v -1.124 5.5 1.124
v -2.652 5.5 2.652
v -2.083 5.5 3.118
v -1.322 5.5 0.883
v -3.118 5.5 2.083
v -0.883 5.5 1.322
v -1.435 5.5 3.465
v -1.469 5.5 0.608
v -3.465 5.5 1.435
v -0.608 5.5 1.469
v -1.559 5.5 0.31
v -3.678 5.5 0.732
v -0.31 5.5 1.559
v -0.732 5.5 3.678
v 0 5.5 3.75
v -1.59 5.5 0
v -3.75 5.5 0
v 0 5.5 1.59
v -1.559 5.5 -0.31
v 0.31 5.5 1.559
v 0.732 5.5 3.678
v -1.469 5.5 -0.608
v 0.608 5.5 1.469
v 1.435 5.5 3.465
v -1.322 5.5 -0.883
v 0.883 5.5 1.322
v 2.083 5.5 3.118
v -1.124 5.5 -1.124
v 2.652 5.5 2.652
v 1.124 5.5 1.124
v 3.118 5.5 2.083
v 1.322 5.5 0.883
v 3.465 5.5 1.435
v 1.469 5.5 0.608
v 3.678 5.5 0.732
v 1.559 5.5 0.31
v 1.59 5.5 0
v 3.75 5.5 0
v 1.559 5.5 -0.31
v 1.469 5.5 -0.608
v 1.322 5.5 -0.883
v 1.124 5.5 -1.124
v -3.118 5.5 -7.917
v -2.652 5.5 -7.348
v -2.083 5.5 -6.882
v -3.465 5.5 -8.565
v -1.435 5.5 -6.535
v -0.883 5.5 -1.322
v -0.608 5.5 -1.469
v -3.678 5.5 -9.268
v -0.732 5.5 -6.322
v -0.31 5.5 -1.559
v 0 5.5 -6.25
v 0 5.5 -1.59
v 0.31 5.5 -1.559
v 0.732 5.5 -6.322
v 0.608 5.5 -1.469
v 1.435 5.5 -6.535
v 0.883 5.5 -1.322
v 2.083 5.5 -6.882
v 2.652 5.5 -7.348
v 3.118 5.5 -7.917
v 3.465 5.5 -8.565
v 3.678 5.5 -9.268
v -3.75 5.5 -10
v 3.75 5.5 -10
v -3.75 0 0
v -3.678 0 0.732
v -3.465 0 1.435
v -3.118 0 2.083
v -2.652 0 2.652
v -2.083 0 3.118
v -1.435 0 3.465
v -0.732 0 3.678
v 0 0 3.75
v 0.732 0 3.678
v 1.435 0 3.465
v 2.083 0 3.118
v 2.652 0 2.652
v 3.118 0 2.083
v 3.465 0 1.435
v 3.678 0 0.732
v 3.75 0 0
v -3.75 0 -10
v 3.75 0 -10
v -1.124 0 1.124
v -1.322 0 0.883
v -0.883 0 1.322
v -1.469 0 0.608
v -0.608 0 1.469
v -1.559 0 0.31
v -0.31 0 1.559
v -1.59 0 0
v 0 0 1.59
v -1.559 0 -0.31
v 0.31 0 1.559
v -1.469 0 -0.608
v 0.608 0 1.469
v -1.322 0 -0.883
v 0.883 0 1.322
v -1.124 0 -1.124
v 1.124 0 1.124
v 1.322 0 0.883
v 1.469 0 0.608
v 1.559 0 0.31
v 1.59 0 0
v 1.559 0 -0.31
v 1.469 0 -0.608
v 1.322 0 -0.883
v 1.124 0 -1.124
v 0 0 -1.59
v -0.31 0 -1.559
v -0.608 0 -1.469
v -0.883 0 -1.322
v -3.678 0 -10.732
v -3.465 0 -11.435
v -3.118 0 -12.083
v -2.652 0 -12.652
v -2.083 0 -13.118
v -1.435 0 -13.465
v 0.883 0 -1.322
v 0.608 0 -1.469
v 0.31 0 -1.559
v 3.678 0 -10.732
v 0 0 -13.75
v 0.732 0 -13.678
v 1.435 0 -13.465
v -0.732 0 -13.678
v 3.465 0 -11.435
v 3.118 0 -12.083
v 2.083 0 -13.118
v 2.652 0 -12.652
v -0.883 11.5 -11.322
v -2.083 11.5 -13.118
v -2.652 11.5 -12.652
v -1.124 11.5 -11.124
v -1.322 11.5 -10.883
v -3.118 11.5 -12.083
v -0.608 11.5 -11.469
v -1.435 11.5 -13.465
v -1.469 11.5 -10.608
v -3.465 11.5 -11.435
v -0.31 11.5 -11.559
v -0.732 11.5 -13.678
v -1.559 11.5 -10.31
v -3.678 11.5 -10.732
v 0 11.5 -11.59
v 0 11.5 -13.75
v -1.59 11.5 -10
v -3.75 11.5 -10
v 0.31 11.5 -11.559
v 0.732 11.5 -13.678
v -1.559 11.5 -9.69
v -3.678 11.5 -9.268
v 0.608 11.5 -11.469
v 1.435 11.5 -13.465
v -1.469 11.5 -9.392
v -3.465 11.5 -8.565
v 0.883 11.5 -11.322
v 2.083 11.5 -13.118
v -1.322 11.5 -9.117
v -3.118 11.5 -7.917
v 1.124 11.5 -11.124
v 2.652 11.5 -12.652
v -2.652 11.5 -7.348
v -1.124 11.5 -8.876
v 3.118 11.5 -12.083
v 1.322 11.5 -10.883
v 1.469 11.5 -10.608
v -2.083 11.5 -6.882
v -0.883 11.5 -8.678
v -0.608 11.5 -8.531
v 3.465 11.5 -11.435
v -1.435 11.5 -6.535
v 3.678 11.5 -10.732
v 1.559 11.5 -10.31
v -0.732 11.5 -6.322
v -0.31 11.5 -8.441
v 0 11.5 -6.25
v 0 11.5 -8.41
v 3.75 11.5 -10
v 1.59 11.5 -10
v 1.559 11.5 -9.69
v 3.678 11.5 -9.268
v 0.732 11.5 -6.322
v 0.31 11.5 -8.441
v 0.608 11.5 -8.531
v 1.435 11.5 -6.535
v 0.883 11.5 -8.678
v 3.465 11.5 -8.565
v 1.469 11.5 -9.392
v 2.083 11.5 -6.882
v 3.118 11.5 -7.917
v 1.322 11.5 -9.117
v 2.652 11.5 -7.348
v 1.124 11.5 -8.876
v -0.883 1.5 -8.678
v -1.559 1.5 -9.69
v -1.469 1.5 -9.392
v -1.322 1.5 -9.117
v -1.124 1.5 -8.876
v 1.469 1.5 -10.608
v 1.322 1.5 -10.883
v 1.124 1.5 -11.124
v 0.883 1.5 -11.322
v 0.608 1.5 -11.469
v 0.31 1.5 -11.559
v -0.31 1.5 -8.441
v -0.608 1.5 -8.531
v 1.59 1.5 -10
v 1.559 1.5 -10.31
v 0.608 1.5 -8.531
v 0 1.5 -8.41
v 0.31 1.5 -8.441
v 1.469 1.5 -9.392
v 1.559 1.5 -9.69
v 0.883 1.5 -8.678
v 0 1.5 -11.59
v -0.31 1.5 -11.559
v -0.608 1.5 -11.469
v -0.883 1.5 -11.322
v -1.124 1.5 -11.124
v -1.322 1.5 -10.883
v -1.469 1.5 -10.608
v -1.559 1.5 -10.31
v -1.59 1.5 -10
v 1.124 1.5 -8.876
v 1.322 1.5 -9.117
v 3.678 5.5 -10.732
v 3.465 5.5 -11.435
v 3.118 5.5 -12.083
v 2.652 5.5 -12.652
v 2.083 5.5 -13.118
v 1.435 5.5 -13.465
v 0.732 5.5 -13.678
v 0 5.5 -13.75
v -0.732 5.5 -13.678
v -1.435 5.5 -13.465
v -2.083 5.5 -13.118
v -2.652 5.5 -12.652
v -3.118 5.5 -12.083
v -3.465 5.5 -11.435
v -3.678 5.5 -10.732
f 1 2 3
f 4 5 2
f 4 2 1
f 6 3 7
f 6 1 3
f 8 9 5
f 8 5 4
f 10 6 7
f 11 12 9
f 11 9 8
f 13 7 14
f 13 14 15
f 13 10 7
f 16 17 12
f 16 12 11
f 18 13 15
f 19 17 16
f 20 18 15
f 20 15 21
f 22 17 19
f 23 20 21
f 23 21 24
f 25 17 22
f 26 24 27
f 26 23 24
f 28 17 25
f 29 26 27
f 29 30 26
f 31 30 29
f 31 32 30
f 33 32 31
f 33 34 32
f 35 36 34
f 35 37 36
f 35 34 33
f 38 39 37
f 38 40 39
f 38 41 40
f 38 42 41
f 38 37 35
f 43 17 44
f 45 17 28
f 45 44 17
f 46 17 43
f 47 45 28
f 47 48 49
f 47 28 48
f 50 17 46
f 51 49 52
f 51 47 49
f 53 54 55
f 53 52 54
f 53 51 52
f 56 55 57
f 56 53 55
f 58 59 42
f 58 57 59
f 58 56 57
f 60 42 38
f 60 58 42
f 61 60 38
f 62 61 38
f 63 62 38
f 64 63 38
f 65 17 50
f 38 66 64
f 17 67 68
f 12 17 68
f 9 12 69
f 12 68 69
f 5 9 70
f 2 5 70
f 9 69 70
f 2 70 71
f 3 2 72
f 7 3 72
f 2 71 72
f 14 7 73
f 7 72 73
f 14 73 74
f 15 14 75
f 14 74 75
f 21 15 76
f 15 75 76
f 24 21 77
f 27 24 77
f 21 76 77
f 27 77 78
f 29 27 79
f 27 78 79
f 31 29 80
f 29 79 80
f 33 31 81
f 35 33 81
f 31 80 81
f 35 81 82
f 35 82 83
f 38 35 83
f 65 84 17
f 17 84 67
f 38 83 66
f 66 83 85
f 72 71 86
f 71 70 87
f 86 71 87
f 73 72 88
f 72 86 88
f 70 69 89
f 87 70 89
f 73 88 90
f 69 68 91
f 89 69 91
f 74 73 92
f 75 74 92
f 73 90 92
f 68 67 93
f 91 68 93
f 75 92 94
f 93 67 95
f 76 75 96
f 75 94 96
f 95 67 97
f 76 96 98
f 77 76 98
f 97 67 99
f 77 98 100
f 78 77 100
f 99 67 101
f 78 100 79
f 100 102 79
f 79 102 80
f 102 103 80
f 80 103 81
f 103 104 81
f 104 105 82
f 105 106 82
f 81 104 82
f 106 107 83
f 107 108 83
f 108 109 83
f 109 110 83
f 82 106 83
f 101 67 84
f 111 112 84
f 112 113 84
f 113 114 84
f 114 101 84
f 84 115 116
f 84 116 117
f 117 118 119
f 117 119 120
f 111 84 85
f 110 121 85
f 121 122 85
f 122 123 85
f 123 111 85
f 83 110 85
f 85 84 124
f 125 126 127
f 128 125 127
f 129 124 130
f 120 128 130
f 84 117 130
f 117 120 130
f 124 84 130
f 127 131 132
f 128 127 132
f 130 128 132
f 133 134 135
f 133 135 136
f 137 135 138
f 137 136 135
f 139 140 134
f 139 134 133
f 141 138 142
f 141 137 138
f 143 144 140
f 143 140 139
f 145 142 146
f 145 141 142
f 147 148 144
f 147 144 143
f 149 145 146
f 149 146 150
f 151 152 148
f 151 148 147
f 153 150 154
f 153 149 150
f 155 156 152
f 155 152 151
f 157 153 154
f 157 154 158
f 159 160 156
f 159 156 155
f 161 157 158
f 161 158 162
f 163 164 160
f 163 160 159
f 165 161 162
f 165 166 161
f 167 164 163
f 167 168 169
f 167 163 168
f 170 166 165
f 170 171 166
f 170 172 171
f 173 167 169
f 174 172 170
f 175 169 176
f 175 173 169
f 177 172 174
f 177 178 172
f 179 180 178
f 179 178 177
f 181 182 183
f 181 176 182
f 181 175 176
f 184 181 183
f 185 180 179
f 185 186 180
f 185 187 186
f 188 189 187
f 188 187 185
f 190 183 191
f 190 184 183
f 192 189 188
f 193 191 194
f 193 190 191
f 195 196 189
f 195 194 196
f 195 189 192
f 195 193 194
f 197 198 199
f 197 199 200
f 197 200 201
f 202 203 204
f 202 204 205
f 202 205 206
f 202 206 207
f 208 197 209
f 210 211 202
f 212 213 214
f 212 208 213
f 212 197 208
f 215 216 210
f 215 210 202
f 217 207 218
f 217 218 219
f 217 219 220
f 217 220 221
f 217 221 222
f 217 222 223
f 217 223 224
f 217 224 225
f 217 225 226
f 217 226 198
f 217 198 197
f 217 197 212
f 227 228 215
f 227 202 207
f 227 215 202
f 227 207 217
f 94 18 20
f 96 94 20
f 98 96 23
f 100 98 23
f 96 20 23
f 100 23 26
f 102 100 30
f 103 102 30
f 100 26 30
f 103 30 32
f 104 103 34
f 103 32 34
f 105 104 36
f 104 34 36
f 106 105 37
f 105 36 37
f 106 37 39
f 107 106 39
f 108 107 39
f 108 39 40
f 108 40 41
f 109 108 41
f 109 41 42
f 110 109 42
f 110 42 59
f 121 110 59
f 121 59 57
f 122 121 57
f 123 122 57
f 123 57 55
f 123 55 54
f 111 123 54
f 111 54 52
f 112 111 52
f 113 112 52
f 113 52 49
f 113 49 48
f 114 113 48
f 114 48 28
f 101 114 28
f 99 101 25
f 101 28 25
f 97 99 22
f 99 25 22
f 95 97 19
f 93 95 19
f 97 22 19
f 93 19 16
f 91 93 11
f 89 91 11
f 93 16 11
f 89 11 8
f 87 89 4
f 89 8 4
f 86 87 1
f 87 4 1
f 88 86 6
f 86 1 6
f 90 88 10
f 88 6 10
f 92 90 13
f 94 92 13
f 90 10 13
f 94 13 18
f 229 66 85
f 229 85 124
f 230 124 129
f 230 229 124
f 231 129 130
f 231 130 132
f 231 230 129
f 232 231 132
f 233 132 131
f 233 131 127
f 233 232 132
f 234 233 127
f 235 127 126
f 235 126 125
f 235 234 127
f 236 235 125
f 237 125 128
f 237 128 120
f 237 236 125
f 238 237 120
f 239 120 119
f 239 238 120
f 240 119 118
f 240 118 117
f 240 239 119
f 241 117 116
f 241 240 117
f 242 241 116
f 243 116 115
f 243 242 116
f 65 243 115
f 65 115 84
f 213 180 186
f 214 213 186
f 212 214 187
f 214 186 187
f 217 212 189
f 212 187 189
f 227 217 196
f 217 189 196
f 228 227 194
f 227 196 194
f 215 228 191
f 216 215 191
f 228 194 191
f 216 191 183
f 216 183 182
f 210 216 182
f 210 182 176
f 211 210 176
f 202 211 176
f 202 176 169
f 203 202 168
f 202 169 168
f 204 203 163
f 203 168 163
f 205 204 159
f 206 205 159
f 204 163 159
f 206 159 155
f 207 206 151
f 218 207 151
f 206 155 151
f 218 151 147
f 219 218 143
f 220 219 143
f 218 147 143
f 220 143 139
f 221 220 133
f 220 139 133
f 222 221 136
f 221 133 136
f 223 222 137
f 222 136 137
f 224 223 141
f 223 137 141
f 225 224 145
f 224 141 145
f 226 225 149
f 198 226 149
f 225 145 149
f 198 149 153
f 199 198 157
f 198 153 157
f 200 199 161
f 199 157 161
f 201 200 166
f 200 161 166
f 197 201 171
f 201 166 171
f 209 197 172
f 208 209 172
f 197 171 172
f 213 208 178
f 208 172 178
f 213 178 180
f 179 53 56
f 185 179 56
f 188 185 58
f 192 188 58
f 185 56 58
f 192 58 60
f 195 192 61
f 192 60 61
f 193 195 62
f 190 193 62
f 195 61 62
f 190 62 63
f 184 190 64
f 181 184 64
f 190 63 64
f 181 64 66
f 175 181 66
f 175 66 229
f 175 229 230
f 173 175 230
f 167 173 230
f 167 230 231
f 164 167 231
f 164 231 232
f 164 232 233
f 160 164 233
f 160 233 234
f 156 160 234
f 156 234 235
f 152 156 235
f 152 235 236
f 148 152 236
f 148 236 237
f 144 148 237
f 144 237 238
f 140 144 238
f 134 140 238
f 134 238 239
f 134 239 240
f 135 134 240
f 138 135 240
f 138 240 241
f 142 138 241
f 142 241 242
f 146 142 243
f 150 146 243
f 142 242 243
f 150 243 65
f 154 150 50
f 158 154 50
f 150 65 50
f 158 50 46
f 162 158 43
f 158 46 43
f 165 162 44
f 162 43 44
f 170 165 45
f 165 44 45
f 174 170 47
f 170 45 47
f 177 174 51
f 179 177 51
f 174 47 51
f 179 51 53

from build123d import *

# Parameters (mm, degrees)
BOSS_EXTRUDE1_DEPTH             = 5.5
SKETCH2_R                       = 1.59
CUT_EXTRUDE1_DEPTH              = 13.013013777
SKETCH3_R                       = 3.75
BOSS_EXTRUDE2_DEPTH             = 6
BOSS_EXTRUDE2_DIRECTION_2_REACH = 14.013
SKETCH4_R                       = 1.59
CUT_EXTRUDE2_DEPTH              = 10


with BuildPart() as part:
    # Sketch1 → Boss-Extrude1 (new body)
    with BuildSketch(Plane(origin=(0, 0, 0), x_dir=(1, 0, 0), z_dir=(0, 1, 0))):
        with BuildLine():
            Line((-3.75, 10), (-3.75, 0))
            ThreePointArc((-3.75, 0), (0, -3.75), (3.75, 0))
            Line((3.75, 0), (3.75, 10))
            Line((3.75, 10), (-3.75, 10))
        make_face()
    extrude(amount=BOSS_EXTRUDE1_DEPTH)

    # Sketch2 → Cut-Extrude1 (cut, through all)
    with BuildSketch(Plane(origin=(0, 5.5, 0), x_dir=(1, 0, 0), z_dir=(0, 1, 0))):
        with Locations(Location((0, 0, 0), (0, 0, 270))):
            Circle(SKETCH2_R)
    extrude(amount=-CUT_EXTRUDE1_DEPTH, mode=Mode.SUBTRACT)

    # Sketch3 → Boss-Extrude2 (add)
    with BuildSketch(Plane(origin=(0, 5.5, 0), x_dir=(1, 0, 0), z_dir=(0, 1, 0))):
        with Locations(Location((0, 10, 0), (0, 0, 270))):
            Circle(SKETCH3_R)
    extrude(amount=BOSS_EXTRUDE2_DEPTH)

    # Boss-Extrude2 direction 2: up to this face of the body (flat: up to its plane)
    boss_extrude2_direction_2_end = Plane(part.part.faces().sort_by_distance((0, 0, -3.812169899))[0])
    # Sketch3 → Boss-Extrude2 direction 2 (add, up to the picked face)
    with BuildSketch(Plane(origin=(0, 5.5, 0), x_dir=(1, 0, 0), z_dir=(0, 1, 0)), mode=Mode.PRIVATE) as boss_extrude2_direction_2_sk1:
        with Locations(Location((0, 10, 0), (0, 0, 270))):
            Circle(SKETCH3_R)
    boss_extrude2_direction_2_tool1 = split(extrude(boss_extrude2_direction_2_sk1.sketch, amount=-BOSS_EXTRUDE2_DIRECTION_2_REACH, mode=Mode.PRIVATE), bisect_by=boss_extrude2_direction_2_end, keep=Keep.BOTH, mode=Mode.PRIVATE)
    add(boss_extrude2_direction_2_tool1.solids().sort_by(Axis((0, 5.5, -10), (0, -1, 0)))[0])

    # Sketch4 → Cut-Extrude2 (cut)
    with BuildSketch(Plane(origin=(0, 11.5, 0), x_dir=(1, 0, 0), z_dir=(0, 1, 0))):
        with Locations(Location((0, 10, 0), (0, 0, 270))):
            Circle(SKETCH4_R)
    extrude(amount=-CUT_EXTRUDE2_DEPTH, mode=Mode.SUBTRACT)


solid = part.part
